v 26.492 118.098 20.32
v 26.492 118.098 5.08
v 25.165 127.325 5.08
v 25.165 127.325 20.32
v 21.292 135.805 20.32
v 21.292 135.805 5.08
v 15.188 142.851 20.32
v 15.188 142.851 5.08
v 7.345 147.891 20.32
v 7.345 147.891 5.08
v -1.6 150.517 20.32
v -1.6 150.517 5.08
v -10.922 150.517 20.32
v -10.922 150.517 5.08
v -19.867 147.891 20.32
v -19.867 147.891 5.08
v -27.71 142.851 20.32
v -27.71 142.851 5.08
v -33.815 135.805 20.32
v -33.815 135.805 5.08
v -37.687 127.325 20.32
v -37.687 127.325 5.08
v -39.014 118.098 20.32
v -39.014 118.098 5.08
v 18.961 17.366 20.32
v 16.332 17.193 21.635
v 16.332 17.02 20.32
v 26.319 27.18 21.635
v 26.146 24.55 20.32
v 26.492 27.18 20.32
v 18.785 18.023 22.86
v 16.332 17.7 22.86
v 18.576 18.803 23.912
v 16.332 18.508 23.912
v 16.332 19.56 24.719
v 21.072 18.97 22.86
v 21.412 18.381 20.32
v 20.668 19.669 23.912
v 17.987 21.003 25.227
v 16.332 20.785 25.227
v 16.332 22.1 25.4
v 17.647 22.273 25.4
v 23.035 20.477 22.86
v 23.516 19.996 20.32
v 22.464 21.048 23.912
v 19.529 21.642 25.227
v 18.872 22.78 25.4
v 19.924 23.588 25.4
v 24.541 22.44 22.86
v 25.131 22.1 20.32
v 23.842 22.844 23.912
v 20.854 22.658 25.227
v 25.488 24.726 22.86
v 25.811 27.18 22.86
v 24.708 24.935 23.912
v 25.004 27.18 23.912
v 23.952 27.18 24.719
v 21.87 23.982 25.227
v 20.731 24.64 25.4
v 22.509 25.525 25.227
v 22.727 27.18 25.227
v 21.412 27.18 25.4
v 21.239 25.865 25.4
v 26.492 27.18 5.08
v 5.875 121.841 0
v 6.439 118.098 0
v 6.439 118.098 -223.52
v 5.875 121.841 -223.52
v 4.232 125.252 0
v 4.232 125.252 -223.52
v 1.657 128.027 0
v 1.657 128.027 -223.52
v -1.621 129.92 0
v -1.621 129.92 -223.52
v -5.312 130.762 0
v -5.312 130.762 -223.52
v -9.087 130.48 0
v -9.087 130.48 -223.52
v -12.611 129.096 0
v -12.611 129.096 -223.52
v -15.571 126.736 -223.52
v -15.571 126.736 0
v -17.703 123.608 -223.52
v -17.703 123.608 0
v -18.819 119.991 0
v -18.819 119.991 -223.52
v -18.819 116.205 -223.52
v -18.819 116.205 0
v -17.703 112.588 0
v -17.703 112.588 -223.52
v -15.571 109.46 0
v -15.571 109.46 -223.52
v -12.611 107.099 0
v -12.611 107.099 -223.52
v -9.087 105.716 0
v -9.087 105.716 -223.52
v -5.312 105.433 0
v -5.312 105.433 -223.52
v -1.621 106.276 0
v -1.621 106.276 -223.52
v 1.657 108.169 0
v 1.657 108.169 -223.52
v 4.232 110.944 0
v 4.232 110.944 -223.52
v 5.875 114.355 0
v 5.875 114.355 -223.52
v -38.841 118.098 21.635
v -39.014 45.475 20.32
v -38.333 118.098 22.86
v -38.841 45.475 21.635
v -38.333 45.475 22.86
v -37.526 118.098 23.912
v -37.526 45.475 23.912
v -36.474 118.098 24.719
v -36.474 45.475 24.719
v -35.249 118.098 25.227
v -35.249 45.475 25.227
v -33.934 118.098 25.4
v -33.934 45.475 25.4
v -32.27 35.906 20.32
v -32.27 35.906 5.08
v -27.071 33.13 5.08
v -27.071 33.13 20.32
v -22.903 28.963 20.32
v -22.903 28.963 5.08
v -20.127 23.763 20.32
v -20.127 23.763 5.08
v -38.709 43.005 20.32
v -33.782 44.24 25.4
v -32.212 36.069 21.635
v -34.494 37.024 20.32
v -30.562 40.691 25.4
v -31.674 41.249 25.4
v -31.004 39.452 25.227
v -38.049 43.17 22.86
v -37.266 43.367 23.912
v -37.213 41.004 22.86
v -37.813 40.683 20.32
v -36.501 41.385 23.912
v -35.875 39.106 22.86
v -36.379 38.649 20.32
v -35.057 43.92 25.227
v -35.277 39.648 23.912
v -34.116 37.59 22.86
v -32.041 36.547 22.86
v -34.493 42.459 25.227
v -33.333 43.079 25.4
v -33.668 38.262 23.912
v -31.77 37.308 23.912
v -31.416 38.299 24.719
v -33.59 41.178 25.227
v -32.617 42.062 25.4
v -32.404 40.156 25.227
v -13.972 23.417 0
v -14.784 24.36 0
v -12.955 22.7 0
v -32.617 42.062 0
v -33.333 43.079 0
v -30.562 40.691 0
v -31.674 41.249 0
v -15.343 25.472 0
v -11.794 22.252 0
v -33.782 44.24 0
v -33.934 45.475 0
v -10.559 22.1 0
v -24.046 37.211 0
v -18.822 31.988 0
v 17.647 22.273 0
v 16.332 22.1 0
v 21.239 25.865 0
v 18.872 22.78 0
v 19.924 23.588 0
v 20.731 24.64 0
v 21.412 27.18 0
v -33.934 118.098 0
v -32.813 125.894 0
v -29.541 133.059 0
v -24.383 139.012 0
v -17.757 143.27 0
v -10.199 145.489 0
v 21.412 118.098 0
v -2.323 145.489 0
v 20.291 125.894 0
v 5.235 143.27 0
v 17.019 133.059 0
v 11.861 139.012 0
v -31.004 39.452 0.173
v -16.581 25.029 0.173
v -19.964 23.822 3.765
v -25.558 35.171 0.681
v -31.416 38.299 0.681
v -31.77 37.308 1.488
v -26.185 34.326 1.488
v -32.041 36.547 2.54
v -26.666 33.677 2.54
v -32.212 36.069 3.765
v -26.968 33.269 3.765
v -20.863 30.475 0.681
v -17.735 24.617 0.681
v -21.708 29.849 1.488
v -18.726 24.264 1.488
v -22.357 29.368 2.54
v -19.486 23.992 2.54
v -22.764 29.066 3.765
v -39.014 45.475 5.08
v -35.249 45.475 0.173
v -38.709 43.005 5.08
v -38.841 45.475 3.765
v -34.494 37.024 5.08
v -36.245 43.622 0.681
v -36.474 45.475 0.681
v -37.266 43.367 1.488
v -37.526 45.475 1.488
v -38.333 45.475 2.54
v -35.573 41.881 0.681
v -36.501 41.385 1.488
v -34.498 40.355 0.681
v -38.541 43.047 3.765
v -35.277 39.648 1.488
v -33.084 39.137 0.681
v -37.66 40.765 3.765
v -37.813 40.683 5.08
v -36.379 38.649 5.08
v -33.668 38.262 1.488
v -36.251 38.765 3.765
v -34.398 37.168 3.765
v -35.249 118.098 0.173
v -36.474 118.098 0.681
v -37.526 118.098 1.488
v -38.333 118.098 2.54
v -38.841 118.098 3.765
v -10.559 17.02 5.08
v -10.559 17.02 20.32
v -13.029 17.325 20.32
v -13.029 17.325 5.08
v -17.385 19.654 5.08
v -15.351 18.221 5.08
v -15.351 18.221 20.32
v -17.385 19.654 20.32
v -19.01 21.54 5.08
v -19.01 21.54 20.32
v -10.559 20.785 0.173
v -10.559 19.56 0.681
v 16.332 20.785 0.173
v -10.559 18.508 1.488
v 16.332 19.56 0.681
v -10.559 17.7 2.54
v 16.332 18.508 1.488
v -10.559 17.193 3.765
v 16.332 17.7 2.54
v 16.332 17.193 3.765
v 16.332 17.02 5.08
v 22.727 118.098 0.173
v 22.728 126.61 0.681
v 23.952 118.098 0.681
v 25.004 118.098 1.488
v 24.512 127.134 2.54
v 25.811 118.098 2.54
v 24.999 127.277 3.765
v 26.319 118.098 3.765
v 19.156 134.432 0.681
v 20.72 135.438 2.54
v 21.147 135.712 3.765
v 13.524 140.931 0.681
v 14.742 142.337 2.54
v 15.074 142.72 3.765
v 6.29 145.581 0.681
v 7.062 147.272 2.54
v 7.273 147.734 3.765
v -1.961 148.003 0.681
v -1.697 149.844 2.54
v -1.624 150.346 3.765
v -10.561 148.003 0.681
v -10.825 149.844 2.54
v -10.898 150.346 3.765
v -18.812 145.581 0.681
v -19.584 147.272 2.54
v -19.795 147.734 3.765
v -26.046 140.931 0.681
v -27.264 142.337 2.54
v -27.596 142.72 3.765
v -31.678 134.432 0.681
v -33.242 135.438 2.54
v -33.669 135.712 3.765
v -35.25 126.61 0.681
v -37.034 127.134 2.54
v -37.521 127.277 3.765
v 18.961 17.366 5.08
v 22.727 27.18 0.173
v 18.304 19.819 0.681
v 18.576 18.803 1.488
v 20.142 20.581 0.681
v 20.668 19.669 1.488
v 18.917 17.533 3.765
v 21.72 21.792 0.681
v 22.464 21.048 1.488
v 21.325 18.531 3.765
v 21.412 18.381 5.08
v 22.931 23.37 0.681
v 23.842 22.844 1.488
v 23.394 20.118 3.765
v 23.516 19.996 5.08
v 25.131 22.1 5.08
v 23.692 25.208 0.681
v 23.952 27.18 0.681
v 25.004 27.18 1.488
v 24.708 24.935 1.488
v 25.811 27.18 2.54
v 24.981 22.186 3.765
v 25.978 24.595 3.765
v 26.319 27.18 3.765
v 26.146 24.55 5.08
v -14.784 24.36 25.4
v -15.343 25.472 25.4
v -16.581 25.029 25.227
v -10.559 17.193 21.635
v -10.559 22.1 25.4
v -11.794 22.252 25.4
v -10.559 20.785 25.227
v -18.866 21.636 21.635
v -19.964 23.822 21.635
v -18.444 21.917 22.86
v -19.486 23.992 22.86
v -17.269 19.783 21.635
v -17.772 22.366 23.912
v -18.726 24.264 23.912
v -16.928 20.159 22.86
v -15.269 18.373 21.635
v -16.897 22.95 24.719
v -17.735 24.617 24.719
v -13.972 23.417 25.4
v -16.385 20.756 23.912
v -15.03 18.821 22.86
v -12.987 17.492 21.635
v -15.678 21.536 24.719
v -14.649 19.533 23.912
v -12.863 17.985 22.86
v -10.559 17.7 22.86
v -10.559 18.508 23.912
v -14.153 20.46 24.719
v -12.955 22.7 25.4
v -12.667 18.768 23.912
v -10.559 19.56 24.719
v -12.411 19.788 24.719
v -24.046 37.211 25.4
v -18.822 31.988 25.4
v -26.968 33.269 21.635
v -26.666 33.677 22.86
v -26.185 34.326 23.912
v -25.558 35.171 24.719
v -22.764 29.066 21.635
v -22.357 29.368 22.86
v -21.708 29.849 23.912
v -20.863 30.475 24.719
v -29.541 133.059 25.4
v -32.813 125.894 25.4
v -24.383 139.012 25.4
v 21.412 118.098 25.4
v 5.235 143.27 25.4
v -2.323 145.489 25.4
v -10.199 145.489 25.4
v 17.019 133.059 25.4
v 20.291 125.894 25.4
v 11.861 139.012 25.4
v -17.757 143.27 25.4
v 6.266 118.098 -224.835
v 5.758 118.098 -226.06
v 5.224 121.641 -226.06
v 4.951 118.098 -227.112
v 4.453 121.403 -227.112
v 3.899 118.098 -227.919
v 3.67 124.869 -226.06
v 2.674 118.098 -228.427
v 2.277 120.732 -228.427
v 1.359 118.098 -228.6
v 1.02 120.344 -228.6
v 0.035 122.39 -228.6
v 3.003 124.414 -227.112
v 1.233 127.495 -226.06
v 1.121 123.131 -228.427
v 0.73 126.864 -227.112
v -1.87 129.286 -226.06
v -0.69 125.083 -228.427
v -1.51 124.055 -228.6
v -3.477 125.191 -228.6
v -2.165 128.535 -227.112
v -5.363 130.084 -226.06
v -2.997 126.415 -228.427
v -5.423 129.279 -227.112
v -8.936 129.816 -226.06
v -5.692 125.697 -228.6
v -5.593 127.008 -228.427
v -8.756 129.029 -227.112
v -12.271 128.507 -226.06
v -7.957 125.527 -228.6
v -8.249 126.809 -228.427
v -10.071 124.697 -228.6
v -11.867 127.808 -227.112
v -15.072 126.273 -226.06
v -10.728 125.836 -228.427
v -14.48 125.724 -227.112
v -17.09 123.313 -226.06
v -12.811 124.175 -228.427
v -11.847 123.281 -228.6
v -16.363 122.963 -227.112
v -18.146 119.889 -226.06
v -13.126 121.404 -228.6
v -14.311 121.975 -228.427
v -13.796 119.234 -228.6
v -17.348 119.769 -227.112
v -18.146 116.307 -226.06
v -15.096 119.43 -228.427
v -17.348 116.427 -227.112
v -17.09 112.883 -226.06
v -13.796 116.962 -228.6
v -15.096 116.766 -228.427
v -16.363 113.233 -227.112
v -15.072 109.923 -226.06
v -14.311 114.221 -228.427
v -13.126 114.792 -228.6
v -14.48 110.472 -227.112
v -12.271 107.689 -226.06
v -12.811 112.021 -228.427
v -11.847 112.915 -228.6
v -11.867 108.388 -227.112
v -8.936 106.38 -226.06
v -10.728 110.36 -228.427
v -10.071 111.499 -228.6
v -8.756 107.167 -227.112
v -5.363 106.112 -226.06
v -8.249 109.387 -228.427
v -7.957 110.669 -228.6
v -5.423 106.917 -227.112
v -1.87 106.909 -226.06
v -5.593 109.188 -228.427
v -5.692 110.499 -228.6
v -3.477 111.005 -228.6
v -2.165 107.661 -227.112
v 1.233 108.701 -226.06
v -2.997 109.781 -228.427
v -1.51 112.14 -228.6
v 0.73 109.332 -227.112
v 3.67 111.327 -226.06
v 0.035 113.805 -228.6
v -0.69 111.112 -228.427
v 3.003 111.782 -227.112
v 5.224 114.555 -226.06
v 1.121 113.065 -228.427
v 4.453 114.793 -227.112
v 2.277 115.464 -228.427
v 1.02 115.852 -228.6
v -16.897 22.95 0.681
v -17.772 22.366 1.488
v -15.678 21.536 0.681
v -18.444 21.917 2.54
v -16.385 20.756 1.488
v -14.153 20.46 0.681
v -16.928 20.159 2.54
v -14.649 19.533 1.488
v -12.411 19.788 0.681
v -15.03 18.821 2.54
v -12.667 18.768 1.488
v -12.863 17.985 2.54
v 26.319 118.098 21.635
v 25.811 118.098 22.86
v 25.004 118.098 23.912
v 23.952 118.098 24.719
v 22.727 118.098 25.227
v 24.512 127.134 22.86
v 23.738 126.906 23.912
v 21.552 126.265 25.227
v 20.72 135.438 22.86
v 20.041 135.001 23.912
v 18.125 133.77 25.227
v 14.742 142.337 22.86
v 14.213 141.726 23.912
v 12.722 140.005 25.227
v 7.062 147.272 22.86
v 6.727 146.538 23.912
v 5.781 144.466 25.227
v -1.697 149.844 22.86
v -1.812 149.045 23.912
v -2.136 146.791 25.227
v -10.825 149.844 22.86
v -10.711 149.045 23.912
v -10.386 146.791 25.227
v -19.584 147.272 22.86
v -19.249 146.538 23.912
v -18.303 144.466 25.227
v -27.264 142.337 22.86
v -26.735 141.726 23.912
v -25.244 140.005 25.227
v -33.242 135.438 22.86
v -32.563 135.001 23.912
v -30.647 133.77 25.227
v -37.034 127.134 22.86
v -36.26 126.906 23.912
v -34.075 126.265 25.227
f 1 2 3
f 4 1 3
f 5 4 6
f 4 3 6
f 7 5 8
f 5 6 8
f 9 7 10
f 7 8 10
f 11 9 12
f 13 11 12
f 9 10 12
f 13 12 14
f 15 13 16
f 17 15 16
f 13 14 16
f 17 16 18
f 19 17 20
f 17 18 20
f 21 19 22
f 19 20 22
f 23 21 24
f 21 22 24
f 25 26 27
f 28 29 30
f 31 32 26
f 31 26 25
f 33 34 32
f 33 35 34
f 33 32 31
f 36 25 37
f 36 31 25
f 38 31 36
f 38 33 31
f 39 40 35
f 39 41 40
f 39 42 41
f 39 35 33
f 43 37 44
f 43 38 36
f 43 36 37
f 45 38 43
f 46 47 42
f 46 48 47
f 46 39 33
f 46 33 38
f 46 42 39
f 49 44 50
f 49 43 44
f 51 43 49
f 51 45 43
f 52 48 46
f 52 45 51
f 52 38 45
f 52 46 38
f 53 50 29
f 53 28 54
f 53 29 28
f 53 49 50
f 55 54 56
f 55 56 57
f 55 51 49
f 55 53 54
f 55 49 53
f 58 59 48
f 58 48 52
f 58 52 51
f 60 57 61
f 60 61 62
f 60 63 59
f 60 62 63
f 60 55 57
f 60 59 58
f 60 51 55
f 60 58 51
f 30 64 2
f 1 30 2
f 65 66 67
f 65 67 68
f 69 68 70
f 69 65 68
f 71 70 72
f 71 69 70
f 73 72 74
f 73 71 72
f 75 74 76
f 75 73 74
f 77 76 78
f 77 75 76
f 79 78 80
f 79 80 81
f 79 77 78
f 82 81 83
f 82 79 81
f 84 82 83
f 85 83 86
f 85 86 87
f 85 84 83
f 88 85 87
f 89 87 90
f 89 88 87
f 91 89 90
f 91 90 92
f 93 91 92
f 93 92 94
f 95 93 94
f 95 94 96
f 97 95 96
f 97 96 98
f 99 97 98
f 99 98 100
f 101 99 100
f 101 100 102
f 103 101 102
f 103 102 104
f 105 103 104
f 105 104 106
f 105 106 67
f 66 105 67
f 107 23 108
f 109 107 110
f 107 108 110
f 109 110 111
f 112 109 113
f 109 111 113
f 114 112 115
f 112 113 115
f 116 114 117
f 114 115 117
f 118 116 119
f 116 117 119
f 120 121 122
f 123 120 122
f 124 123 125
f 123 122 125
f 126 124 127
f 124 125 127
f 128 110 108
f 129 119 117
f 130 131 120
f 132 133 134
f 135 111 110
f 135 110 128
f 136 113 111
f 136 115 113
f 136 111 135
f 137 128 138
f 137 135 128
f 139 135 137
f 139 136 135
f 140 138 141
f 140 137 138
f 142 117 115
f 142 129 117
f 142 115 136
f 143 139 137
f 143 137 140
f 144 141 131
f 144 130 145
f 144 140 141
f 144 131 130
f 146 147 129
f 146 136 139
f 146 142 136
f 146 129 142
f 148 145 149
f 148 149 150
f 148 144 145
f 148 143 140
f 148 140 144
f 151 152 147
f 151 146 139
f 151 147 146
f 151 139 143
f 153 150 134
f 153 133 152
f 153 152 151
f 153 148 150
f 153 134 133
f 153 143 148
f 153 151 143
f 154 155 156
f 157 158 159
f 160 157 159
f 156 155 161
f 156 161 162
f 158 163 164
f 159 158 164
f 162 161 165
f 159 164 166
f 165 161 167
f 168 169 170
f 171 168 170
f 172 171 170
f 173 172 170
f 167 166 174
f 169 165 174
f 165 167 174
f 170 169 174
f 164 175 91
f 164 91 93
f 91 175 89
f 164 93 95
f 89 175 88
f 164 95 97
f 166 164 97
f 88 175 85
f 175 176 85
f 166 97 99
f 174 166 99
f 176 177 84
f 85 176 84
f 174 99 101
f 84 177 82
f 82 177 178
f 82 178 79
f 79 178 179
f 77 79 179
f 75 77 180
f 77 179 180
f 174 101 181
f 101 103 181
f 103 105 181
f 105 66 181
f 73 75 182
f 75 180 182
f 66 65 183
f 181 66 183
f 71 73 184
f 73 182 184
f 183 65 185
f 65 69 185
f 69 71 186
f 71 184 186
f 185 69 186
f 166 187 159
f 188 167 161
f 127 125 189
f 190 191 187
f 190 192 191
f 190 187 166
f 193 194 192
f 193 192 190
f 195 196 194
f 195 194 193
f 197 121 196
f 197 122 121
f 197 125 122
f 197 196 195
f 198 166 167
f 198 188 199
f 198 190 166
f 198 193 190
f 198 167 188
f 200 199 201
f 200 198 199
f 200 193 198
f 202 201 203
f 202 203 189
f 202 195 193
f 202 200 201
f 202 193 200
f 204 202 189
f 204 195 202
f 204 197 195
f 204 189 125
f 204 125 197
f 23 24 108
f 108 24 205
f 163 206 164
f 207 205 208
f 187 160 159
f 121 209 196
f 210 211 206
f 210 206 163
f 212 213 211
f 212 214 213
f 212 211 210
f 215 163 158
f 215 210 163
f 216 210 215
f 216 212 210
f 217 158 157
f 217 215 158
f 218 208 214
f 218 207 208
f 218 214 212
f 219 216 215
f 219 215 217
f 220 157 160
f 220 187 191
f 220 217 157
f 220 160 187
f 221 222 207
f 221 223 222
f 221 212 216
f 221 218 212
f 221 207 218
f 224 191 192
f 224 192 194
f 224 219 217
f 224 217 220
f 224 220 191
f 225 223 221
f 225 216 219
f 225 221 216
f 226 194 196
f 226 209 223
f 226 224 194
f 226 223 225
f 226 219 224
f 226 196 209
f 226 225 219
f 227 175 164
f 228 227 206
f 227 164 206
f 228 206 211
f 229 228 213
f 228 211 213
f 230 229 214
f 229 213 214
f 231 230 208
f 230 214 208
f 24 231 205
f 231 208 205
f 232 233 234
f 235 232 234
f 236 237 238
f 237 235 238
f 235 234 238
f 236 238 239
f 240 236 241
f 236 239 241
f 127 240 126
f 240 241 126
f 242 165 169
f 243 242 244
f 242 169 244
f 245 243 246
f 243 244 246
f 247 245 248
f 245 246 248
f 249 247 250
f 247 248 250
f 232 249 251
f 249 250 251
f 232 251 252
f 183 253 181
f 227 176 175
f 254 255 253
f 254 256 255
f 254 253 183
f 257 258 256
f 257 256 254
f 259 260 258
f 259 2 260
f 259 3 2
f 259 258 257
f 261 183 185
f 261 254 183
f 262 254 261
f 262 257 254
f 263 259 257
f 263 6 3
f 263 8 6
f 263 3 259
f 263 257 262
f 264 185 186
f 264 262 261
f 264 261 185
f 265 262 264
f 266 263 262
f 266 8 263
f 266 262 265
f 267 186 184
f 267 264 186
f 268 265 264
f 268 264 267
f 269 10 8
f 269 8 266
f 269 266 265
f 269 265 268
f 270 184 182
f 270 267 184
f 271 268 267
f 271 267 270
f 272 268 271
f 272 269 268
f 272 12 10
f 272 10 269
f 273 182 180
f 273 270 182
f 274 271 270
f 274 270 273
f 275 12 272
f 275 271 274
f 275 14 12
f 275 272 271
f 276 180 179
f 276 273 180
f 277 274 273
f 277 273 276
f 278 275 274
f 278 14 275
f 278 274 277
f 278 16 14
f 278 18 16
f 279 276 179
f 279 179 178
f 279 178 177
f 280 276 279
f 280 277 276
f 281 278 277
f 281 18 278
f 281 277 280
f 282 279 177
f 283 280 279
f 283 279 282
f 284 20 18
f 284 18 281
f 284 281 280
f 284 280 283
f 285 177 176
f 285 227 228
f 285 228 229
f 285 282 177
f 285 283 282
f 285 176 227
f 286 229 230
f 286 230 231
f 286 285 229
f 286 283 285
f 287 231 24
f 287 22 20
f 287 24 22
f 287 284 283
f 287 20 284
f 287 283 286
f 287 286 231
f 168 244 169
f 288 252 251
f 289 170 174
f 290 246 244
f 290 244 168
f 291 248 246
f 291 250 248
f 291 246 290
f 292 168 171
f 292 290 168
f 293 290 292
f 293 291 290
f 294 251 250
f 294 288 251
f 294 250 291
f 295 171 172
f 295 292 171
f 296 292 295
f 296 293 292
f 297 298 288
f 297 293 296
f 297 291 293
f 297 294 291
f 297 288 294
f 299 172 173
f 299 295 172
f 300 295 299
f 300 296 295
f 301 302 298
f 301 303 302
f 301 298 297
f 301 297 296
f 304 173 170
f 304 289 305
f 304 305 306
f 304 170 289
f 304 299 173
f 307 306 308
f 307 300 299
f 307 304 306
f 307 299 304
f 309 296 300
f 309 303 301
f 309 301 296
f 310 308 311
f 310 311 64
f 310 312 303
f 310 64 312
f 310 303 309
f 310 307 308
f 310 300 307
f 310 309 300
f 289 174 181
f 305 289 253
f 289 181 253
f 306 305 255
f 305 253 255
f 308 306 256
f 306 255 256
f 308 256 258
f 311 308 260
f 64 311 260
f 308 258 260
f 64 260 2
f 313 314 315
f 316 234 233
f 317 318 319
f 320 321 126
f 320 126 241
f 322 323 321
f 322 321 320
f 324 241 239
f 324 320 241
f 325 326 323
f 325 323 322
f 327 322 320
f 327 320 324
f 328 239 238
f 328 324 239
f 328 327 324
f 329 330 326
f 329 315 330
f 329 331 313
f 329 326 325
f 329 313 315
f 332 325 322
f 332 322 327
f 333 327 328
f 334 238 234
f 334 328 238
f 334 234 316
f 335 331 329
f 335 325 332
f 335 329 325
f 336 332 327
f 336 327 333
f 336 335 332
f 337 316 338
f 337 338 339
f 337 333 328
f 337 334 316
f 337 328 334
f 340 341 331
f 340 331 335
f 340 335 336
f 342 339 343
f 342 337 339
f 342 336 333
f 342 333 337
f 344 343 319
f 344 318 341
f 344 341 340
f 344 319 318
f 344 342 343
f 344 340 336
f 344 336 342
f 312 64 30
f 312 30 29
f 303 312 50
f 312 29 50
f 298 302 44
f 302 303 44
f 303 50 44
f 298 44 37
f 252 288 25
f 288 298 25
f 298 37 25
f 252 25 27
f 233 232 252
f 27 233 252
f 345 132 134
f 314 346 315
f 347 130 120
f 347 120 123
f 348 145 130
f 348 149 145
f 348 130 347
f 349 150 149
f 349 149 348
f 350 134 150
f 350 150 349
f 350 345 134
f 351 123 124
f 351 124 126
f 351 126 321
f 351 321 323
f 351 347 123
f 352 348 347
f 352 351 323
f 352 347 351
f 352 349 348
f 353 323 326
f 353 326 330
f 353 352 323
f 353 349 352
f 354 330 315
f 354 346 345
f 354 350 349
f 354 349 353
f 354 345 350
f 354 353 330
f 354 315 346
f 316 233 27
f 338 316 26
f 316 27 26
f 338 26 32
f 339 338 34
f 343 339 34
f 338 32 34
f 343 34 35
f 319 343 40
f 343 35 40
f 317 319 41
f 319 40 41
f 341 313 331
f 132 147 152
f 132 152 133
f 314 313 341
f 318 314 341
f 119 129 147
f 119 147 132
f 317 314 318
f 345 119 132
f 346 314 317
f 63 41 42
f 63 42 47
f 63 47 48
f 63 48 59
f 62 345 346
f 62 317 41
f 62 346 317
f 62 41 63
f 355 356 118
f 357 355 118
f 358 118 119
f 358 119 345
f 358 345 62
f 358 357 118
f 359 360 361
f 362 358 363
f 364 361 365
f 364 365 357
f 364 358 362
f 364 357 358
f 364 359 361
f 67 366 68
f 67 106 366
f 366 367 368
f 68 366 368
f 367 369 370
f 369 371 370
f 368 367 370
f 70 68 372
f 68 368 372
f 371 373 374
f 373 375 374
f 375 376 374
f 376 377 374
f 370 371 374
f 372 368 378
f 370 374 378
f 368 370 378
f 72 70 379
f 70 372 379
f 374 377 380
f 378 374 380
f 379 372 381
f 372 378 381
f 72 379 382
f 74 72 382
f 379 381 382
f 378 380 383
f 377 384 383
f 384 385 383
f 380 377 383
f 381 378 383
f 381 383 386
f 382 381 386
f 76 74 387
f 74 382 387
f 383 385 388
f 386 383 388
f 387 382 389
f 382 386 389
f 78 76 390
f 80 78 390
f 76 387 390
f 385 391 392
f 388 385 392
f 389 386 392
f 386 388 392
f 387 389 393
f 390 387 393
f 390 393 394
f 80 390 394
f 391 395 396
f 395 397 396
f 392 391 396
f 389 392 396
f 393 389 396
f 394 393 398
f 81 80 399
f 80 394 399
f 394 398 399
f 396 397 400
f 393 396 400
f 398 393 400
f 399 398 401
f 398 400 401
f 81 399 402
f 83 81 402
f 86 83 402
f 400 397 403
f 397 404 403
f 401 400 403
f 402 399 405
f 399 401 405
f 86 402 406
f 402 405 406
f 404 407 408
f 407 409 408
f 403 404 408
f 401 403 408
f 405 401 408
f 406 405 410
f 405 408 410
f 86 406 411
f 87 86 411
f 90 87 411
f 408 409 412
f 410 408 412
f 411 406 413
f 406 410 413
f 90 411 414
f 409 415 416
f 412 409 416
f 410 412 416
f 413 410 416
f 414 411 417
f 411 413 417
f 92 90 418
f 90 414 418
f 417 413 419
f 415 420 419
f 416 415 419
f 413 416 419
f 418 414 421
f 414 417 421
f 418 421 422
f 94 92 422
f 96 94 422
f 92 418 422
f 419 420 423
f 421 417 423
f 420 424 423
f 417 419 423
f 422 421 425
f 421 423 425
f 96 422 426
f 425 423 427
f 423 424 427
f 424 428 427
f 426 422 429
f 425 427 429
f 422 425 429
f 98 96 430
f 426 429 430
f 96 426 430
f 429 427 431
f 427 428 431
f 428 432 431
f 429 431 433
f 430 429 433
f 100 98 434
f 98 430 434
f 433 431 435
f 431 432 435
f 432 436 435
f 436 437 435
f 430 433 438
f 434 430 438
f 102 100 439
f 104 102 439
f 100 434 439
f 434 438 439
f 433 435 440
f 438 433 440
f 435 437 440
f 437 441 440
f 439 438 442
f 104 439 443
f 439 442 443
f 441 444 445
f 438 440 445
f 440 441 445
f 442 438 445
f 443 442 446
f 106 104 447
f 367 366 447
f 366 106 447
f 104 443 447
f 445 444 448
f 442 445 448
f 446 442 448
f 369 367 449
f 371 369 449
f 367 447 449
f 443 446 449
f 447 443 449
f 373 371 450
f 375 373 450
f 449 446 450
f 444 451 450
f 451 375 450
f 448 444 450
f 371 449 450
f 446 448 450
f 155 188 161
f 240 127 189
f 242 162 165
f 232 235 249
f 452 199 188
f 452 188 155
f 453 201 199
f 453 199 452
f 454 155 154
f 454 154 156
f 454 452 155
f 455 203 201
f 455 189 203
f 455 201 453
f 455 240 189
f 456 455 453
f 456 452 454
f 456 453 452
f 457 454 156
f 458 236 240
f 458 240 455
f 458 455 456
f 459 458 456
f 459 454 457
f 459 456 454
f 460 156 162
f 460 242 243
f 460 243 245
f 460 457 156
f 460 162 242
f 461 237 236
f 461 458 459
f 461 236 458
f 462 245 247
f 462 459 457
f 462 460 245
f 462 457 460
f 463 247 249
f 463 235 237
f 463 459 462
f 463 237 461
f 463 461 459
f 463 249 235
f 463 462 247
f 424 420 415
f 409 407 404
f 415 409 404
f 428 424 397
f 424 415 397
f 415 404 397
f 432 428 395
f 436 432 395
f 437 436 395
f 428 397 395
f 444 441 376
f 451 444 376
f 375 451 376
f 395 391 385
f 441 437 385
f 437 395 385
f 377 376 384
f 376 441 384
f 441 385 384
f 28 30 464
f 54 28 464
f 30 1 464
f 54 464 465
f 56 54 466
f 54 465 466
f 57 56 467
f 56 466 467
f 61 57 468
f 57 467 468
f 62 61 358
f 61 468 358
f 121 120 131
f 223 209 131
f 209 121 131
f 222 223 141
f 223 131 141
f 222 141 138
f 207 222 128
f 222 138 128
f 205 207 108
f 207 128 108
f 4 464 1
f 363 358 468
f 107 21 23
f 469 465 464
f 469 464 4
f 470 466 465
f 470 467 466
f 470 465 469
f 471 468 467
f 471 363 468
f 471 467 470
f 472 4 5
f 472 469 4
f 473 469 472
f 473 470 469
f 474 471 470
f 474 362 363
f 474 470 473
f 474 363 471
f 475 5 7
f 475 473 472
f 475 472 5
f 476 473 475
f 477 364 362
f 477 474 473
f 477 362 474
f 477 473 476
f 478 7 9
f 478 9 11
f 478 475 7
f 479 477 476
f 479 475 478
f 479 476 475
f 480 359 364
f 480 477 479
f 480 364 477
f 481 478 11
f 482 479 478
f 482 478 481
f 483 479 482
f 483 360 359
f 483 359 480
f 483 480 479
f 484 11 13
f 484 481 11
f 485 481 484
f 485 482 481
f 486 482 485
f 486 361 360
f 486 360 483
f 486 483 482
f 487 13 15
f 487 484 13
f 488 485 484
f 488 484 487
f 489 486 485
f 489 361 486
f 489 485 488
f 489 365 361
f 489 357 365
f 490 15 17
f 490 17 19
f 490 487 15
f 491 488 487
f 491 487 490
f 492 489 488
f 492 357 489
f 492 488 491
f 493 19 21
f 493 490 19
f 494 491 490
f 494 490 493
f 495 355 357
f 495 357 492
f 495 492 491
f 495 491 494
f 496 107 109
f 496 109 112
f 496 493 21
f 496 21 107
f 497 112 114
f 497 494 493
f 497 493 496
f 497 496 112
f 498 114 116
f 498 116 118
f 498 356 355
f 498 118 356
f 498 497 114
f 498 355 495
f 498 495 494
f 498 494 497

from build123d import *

# Parameters (mm, degrees)
F0_R     = 12.7
F1_DEPTH = 25.4
F2_R     = 12.7
F3_DEPTH = 254
F4_R     = 5.08
F5_R     = 10.16
F6_R     = 5.08


with BuildPart() as f1:
    # F0 (on Top) → F1 (new body)
    with BuildSketch(Plane.XY):
        with BuildLine():
            Line((26.491852, 17.019746), (26.491852, 118.097939))
            ThreePointArc((26.491852, 118.097939), (-6.261039, 150.85083), (-39.013931, 118.097939))
            Line((-39.013931, 118.097939), (-39.013931, 37.074262))
            ThreePointArc((-39.013931, 37.074262), (-24.833246, 31.20043), (-18.959414, 17.019746))
            Line((-18.959414, 17.019746), (26.491852, 17.019746))
        make_face()
        with Locations((-6.261039, 118.097939)):
            Circle(F0_R, mode=Mode.SUBTRACT)
    extrude(amount=F1_DEPTH)

    # F2 (on face) → F3 (join)
    with BuildSketch(Plane.XY.offset(25.4)):
        with Locations((-6.261039, 118.097939)):
            Circle(F2_R)
    extrude(amount=-F3_DEPTH)

    # F4
    f4_edges = [f1.edges().sort_by_distance(p)[0] for p in [
        (-18.961039, 118.097939, -228.6),
    ]]
    fillet(f4_edges, radius=F4_R)

    # F5
    f5_edges = [f1.edges().sort_by_distance(p)[0] for p in [
        (26.491852, 17.019746, 12.7),
        (-18.959414, 17.019746, 12.7),
        (-39.013931, 37.074262, 12.7),
    ]]
    fillet(f5_edges, radius=F5_R)

    # F6
    f6_edges = [f1.edges().sort_by_distance(p)[0] for p in [
        (-39.013931, 81.786381, 25.4),
        (-39.013931, 81.786381, 0),
    ]]
    fillet(f6_edges, radius=F6_R)


solid = f1.part
